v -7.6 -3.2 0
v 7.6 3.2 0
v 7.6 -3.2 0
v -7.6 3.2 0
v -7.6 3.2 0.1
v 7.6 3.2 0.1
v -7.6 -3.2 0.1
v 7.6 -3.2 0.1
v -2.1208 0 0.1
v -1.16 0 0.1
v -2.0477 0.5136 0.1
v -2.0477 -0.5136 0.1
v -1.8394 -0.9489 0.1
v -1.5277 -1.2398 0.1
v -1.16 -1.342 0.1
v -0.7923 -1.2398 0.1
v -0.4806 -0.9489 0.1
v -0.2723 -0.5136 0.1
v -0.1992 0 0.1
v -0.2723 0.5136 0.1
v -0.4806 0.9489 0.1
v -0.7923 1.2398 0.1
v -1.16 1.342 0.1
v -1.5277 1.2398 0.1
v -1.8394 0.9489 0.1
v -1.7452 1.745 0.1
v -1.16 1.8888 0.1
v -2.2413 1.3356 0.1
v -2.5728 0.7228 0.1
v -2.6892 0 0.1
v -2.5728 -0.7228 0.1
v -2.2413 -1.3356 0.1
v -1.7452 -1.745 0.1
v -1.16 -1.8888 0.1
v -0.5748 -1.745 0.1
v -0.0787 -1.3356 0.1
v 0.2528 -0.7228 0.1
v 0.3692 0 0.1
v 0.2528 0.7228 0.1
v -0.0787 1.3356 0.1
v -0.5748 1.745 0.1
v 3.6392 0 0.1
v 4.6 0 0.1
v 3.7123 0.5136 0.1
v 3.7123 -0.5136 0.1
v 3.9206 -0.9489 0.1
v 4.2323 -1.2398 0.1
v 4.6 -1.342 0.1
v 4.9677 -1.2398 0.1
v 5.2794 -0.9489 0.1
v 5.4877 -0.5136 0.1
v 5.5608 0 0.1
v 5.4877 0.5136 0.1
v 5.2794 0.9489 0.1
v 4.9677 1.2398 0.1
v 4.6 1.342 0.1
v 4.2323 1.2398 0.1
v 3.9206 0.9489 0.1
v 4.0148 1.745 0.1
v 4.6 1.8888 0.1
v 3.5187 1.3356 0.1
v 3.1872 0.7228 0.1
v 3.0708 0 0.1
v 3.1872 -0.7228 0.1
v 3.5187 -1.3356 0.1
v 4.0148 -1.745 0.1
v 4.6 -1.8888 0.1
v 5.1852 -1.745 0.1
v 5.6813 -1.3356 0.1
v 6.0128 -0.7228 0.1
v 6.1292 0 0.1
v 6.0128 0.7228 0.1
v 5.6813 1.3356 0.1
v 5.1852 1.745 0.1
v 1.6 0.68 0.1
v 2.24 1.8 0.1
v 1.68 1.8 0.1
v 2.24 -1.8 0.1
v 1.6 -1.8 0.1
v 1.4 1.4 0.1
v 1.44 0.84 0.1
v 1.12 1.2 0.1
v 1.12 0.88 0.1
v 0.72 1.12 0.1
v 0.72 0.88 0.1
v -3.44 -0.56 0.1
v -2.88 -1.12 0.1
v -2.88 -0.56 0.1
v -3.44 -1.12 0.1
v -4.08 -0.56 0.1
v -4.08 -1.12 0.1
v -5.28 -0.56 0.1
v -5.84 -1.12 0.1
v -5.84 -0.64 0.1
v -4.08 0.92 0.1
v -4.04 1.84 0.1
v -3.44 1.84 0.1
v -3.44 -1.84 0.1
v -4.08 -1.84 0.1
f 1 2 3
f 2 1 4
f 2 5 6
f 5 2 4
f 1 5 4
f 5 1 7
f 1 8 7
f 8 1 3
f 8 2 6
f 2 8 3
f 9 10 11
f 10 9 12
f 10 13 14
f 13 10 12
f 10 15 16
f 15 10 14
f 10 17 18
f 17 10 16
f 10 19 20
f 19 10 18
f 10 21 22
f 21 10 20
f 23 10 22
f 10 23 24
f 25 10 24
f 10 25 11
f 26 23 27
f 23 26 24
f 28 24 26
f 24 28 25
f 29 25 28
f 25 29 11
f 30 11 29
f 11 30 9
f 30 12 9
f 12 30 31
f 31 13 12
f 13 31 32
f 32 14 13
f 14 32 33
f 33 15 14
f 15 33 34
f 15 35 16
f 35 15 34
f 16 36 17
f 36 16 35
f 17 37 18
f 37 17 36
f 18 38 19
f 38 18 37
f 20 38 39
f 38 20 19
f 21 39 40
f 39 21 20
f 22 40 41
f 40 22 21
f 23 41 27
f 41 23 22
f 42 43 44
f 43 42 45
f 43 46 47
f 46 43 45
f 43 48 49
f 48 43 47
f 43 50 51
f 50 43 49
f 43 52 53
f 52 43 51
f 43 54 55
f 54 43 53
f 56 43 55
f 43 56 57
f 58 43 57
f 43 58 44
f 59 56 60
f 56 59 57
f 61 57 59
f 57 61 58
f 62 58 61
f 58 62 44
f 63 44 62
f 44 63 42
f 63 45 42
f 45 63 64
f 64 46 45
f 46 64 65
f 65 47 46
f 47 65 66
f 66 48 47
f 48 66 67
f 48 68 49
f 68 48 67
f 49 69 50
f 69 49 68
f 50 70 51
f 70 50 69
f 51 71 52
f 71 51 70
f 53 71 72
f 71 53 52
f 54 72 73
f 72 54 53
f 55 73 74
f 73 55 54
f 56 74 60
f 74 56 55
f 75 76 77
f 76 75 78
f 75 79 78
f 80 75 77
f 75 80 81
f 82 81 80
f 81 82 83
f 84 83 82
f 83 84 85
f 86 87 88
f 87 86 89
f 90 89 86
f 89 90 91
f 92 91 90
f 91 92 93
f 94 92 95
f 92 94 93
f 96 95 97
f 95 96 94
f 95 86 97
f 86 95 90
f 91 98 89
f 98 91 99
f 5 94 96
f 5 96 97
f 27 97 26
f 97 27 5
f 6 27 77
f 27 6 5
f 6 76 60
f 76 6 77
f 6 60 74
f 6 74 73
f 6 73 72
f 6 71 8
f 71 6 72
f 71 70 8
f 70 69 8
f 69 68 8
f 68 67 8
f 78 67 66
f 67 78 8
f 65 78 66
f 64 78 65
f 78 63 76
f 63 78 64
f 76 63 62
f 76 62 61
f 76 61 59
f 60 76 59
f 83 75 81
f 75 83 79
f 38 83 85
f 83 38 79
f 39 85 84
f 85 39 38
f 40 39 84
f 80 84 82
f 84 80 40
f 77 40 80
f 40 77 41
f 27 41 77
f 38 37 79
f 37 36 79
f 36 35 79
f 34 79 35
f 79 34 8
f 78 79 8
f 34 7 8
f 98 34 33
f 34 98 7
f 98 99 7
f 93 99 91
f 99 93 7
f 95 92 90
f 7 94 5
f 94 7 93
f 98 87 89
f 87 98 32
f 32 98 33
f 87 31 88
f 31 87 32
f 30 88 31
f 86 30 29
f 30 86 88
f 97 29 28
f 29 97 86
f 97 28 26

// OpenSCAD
// file: ../p/box5-12.scad
use <../lib.scad>
function ldraw_lib__box5_12() = [
// 0 Box with 5 Faces without Any Edges
// 0 Name: box5-12.dat
// 0 Author: Chris Dee [cwdee]
// 0 !LDRAW_ORG Primitive UPDATE 2009-02
// 0 !LICENSE Licensed under CC BY 2.0 and CC BY 4.0 : see CAreadme.txt
// 
// 0 BFC CERTIFY CCW
  [0,"BFC","CERTIFY"],
  [0,"BFC","CCW"],
// 
// 0 !HISTORY 2009-09-03 [PTadmin] Official Update 2009-02
// 
// 
// 4 16 1 1 1 1 1 -1 -1 1 -1 -1 1 1
  [4,16,1,1,1,1,1,-1,-1,1,-1,-1,1,1],
// 4 16 -1 0 1 1 0 1 1 1 1 -1 1 1
  [4,16,-1,0,1,1,0,1,1,1,1,-1,1,1],
// 4 16 -1 0 -1 -1 0 1 -1 1 1 -1 1 -1
  [4,16,-1,0,-1,-1,0,1,-1,1,1,-1,1,-1],
// 4 16 1 0 -1 -1 0 -1 -1 1 -1 1 1 -1
  [4,16,1,0,-1,-1,0,-1,-1,1,-1,1,1,-1],
// 4 16 1 0 1 1 0 -1 1 1 -1 1 1 1
  [4,16,1,0,1,1,0,-1,1,1,-1,1,1,1],
// 0
];
makepoly(ldraw_lib__box5_12(), line=0.2);
// main file
use <../lib.scad>
use <../p/box5-12.scad>
function ldraw_lib__197875b() = [
// 0 Sticker  0.8 x  1.9 with White "4010"
// 0 Name: 197875b.dat
// 0 Author: Philippe Hurbain [Philo]
// 0 !LDRAW_ORG Part UPDATE 2015-01
// 0 !LICENSE Licensed under CC BY 2.0 and CC BY 4.0 : see CAreadme.txt
// 
// 0 BFC CERTIFY CCW
  [0,"BFC","CERTIFY"],
  [0,"BFC","CCW"],
// 
// 0 !KEYWORDS Set 4010
// 
// 0 !HISTORY 2015-10-11 [PTadmin] Official Update 2015-01
// 
// 
// 1 16 0 -0.25 0 19 0 0 0 0.25 0 0 0 8 box5-12.dat
  [1,16,0,-0.25,0,19,0,0,0,0.25,0,0,0,8, ldraw_lib__box5_12()],
// 4 16 -2.9 -0.25 0 -5.1192 -0.25 1.2839 -5.302 -0.25 0 -5.1192 -0.25 -1.2839
  [4,16,-2.9,-0.25,0,-5.1192,-0.25,1.2839,-5.302,-0.25,0,-5.1192,-0.25,-1.2839],
// 4 16 -2.9 -0.25 0 -5.1192 -0.25 -1.2839 -4.5985 -0.25 -2.3723 -3.8192 -0.25 -3.0996
  [4,16,-2.9,-0.25,0,-5.1192,-0.25,-1.2839,-4.5985,-0.25,-2.3723,-3.8192,-0.25,-3.0996],
// 4 16 -2.9 -0.25 0 -3.8192 -0.25 -3.0996 -2.9 -0.25 -3.355 -1.9808 -0.25 -3.0996
  [4,16,-2.9,-0.25,0,-3.8192,-0.25,-3.0996,-2.9,-0.25,-3.355,-1.9808,-0.25,-3.0996],
// 4 16 -2.9 -0.25 0 -1.9808 -0.25 -3.0996 -1.2015 -0.25 -2.3723 -0.6808 -0.25 -1.2839
  [4,16,-2.9,-0.25,0,-1.9808,-0.25,-3.0996,-1.2015,-0.25,-2.3723,-0.6808,-0.25,-1.2839],
// 4 16 -2.9 -0.25 0 -0.6808 -0.25 -1.2839 -0.498 -0.25 0 -0.6808 -0.25 1.2839
  [4,16,-2.9,-0.25,0,-0.6808,-0.25,-1.2839,-0.498,-0.25,0,-0.6808,-0.25,1.2839],
// 4 16 -2.9 -0.25 0 -0.6808 -0.25 1.2839 -1.2015 -0.25 2.3723 -1.9808 -0.25 3.0996
  [4,16,-2.9,-0.25,0,-0.6808,-0.25,1.2839,-1.2015,-0.25,2.3723,-1.9808,-0.25,3.0996],
// 4 16 -2.9 -0.25 0 -1.9808 -0.25 3.0996 -2.9 -0.25 3.355 -3.8192 -0.25 3.0996
  [4,16,-2.9,-0.25,0,-1.9808,-0.25,3.0996,-2.9,-0.25,3.355,-3.8192,-0.25,3.0996],
// 4 16 -2.9 -0.25 0 -3.8192 -0.25 3.0996 -4.5985 -0.25 2.3723 -5.1192 -0.25 1.2839
  [4,16,-2.9,-0.25,0,-3.8192,-0.25,3.0996,-4.5985,-0.25,2.3723,-5.1192,-0.25,1.2839],
// 4 15 -2.9 -0.25 3.355 -2.9 -0.25 4.722 -4.363 -0.25 4.3626 -3.8192 -0.25 3.0996
  [4,15,-2.9,-0.25,3.355,-2.9,-0.25,4.722,-4.363,-0.25,4.3626,-3.8192,-0.25,3.0996],
// 4 15 -3.8192 -0.25 3.0996 -4.363 -0.25 4.3626 -5.6033 -0.25 3.339 -4.5985 -0.25 2.3723
  [4,15,-3.8192,-0.25,3.0996,-4.363,-0.25,4.3626,-5.6033,-0.25,3.339,-4.5985,-0.25,2.3723],
// 4 15 -4.5985 -0.25 2.3723 -5.6033 -0.25 3.339 -6.432 -0.25 1.807 -5.1192 -0.25 1.2839
  [4,15,-4.5985,-0.25,2.3723,-5.6033,-0.25,3.339,-6.432,-0.25,1.807,-5.1192,-0.25,1.2839],
// 4 15 -5.1192 -0.25 1.2839 -6.432 -0.25 1.807 -6.723 -0.25 0 -5.302 -0.25 0
  [4,15,-5.1192,-0.25,1.2839,-6.432,-0.25,1.807,-6.723,-0.25,0,-5.302,-0.25,0],
// 4 15 -5.302 -0.25 0 -6.723 -0.25 0 -6.432 -0.25 -1.807 -5.1192 -0.25 -1.2839
  [4,15,-5.302,-0.25,0,-6.723,-0.25,0,-6.432,-0.25,-1.807,-5.1192,-0.25,-1.2839],
// 4 15 -5.1192 -0.25 -1.2839 -6.432 -0.25 -1.807 -5.6033 -0.25 -3.339 -4.5985 -0.25 -2.3723
  [4,15,-5.1192,-0.25,-1.2839,-6.432,-0.25,-1.807,-5.6033,-0.25,-3.339,-4.5985,-0.25,-2.3723],
// 4 15 -4.5985 -0.25 -2.3723 -5.6033 -0.25 -3.339 -4.363 -0.25 -4.3626 -3.8192 -0.25 -3.0996
  [4,15,-4.5985,-0.25,-2.3723,-5.6033,-0.25,-3.339,-4.363,-0.25,-4.3626,-3.8192,-0.25,-3.0996],
// 4 15 -3.8192 -0.25 -3.0996 -4.363 -0.25 -4.3626 -2.9 -0.25 -4.722 -2.9 -0.25 -3.355
  [4,15,-3.8192,-0.25,-3.0996,-4.363,-0.25,-4.3626,-2.9,-0.25,-4.722,-2.9,-0.25,-3.355],
// 4 15 -2.9 -0.25 -3.355 -2.9 -0.25 -4.722 -1.437 -0.25 -4.3626 -1.9808 -0.25 -3.0996
  [4,15,-2.9,-0.25,-3.355,-2.9,-0.25,-4.722,-1.437,-0.25,-4.3626,-1.9808,-0.25,-3.0996],
// 4 15 -1.9808 -0.25 -3.0996 -1.437 -0.25 -4.3626 -0.1967 -0.25 -3.339 -1.2015 -0.25 -2.3723
  [4,15,-1.9808,-0.25,-3.0996,-1.437,-0.25,-4.3626,-0.1967,-0.25,-3.339,-1.2015,-0.25,-2.3723],
// 4 15 -1.2015 -0.25 -2.3723 -0.1967 -0.25 -3.339 0.632 -0.25 -1.807 -0.6808 -0.25 -1.2839
  [4,15,-1.2015,-0.25,-2.3723,-0.1967,-0.25,-3.339,0.632,-0.25,-1.807,-0.6808,-0.25,-1.2839],
// 4 15 -0.6808 -0.25 -1.2839 0.632 -0.25 -1.807 0.923 -0.25 0 -0.498 -0.25 0
  [4,15,-0.6808,-0.25,-1.2839,0.632,-0.25,-1.807,0.923,-0.25,0,-0.498,-0.25,0],
// 4 15 -0.498 -0.25 0 0.923 -0.25 0 0.632 -0.25 1.807 -0.6808 -0.25 1.2839
  [4,15,-0.498,-0.25,0,0.923,-0.25,0,0.632,-0.25,1.807,-0.6808,-0.25,1.2839],
// 4 15 -0.6808 -0.25 1.2839 0.632 -0.25 1.807 -0.1967 -0.25 3.339 -1.2015 -0.25 2.3723
  [4,15,-0.6808,-0.25,1.2839,0.632,-0.25,1.807,-0.1967,-0.25,3.339,-1.2015,-0.25,2.3723],
// 4 15 -1.2015 -0.25 2.3723 -0.1967 -0.25 3.339 -1.437 -0.25 4.3626 -1.9808 -0.25 3.0996
  [4,15,-1.2015,-0.25,2.3723,-0.1967,-0.25,3.339,-1.437,-0.25,4.3626,-1.9808,-0.25,3.0996],
// 4 15 -1.9808 -0.25 3.0996 -1.437 -0.25 4.3626 -2.9 -0.25 4.722 -2.9 -0.25 3.355
  [4,15,-1.9808,-0.25,3.0996,-1.437,-0.25,4.3626,-2.9,-0.25,4.722,-2.9,-0.25,3.355],
// 4 16 11.5 -0.25 0 9.2808 -0.25 1.2839 9.098 -0.25 0 9.2808 -0.25 -1.2839
  [4,16,11.5,-0.25,0,9.2808,-0.25,1.2839,9.098,-0.25,0,9.2808,-0.25,-1.2839],
// 4 16 11.5 -0.25 0 9.2808 -0.25 -1.2839 9.8015 -0.25 -2.3723 10.5808 -0.25 -3.0996
  [4,16,11.5,-0.25,0,9.2808,-0.25,-1.2839,9.8015,-0.25,-2.3723,10.5808,-0.25,-3.0996],
// 4 16 11.5 -0.25 0 10.5808 -0.25 -3.0996 11.5 -0.25 -3.355 12.4192 -0.25 -3.0996
  [4,16,11.5,-0.25,0,10.5808,-0.25,-3.0996,11.5,-0.25,-3.355,12.4192,-0.25,-3.0996],
// 4 16 11.5 -0.25 0 12.4192 -0.25 -3.0996 13.1985 -0.25 -2.3723 13.7192 -0.25 -1.2839
  [4,16,11.5,-0.25,0,12.4192,-0.25,-3.0996,13.1985,-0.25,-2.3723,13.7192,-0.25,-1.2839],
// 4 16 11.5 -0.25 0 13.7192 -0.25 -1.2839 13.902 -0.25 0 13.7192 -0.25 1.2839
  [4,16,11.5,-0.25,0,13.7192,-0.25,-1.2839,13.902,-0.25,0,13.7192,-0.25,1.2839],
// 4 16 11.5 -0.25 0 13.7192 -0.25 1.2839 13.1985 -0.25 2.3723 12.4192 -0.25 3.0996
  [4,16,11.5,-0.25,0,13.7192,-0.25,1.2839,13.1985,-0.25,2.3723,12.4192,-0.25,3.0996],
// 4 16 11.5 -0.25 0 12.4192 -0.25 3.0996 11.5 -0.25 3.355 10.5808 -0.25 3.0996
  [4,16,11.5,-0.25,0,12.4192,-0.25,3.0996,11.5,-0.25,3.355,10.5808,-0.25,3.0996],
// 4 16 11.5 -0.25 0 10.5808 -0.25 3.0996 9.8015 -0.25 2.3723 9.2808 -0.25 1.2839
  [4,16,11.5,-0.25,0,10.5808,-0.25,3.0996,9.8015,-0.25,2.3723,9.2808,-0.25,1.2839],
// 4 15 11.5 -0.25 3.355 11.5 -0.25 4.722 10.037 -0.25 4.3626 10.5808 -0.25 3.0996
  [4,15,11.5,-0.25,3.355,11.5,-0.25,4.722,10.037,-0.25,4.3626,10.5808,-0.25,3.0996],
// 4 15 10.5808 -0.25 3.0996 10.037 -0.25 4.3626 8.7967 -0.25 3.339 9.8015 -0.25 2.3723
  [4,15,10.5808,-0.25,3.0996,10.037,-0.25,4.3626,8.7967,-0.25,3.339,9.8015,-0.25,2.3723],
// 4 15 9.8015 -0.25 2.3723 8.7967 -0.25 3.339 7.968 -0.25 1.807 9.2808 -0.25 1.2839
  [4,15,9.8015,-0.25,2.3723,8.7967,-0.25,3.339,7.968,-0.25,1.807,9.2808,-0.25,1.2839],
// 4 15 9.2808 -0.25 1.2839 7.968 -0.25 1.807 7.677 -0.25 0 9.098 -0.25 0
  [4,15,9.2808,-0.25,1.2839,7.968,-0.25,1.807,7.677,-0.25,0,9.098,-0.25,0],
// 4 15 9.098 -0.25 0 7.677 -0.25 0 7.968 -0.25 -1.807 9.2808 -0.25 -1.2839
  [4,15,9.098,-0.25,0,7.677,-0.25,0,7.968,-0.25,-1.807,9.2808,-0.25,-1.2839],
// 4 15 9.2808 -0.25 -1.2839 7.968 -0.25 -1.807 8.7967 -0.25 -3.339 9.8015 -0.25 -2.3723
  [4,15,9.2808,-0.25,-1.2839,7.968,-0.25,-1.807,8.7967,-0.25,-3.339,9.8015,-0.25,-2.3723],
// 4 15 9.8015 -0.25 -2.3723 8.7967 -0.25 -3.339 10.037 -0.25 -4.3626 10.5808 -0.25 -3.0996
  [4,15,9.8015,-0.25,-2.3723,8.7967,-0.25,-3.339,10.037,-0.25,-4.3626,10.5808,-0.25,-3.0996],
// 4 15 10.5808 -0.25 -3.0996 10.037 -0.25 -4.3626 11.5 -0.25 -4.722 11.5 -0.25 -3.355
  [4,15,10.5808,-0.25,-3.0996,10.037,-0.25,-4.3626,11.5,-0.25,-4.722,11.5,-0.25,-3.355],
// 4 15 11.5 -0.25 -3.355 11.5 -0.25 -4.722 12.963 -0.25 -4.3626 12.4192 -0.25 -3.0996
  [4,15,11.5,-0.25,-3.355,11.5,-0.25,-4.722,12.963,-0.25,-4.3626,12.4192,-0.25,-3.0996],
// 4 15 12.4192 -0.25 -3.0996 12.963 -0.25 -4.3626 14.2033 -0.25 -3.339 13.1985 -0.25 -2.3723
  [4,15,12.4192,-0.25,-3.0996,12.963,-0.25,-4.3626,14.2033,-0.25,-3.339,13.1985,-0.25,-2.3723],
// 4 15 13.1985 -0.25 -2.3723 14.2033 -0.25 -3.339 15.032 -0.25 -1.807 13.7192 -0.25 -1.2839
  [4,15,13.1985,-0.25,-2.3723,14.2033,-0.25,-3.339,15.032,-0.25,-1.807,13.7192,-0.25,-1.2839],
// 4 15 13.7192 -0.25 -1.2839 15.032 -0.25 -1.807 15.323 -0.25 0 13.902 -0.25 0
  [4,15,13.7192,-0.25,-1.2839,15.032,-0.25,-1.807,15.323,-0.25,0,13.902,-0.25,0],
// 4 15 13.902 -0.25 0 15.323 -0.25 0 15.032 -0.25 1.807 13.7192 -0.25 1.2839
  [4,15,13.902,-0.25,0,15.323,-0.25,0,15.032,-0.25,1.807,13.7192,-0.25,1.2839],
// 4 15 13.7192 -0.25 1.2839 15.032 -0.25 1.807 14.2033 -0.25 3.339 13.1985 -0.25 2.3723
  [4,15,13.7192,-0.25,1.2839,15.032,-0.25,1.807,14.2033,-0.25,3.339,13.1985,-0.25,2.3723],
// 4 15 13.1985 -0.25 2.3723 14.2033 -0.25 3.339 12.963 -0.25 4.3626 12.4192 -0.25 3.0996
  [4,15,13.1985,-0.25,2.3723,14.2033,-0.25,3.339,12.963,-0.25,4.3626,12.4192,-0.25,3.0996],
// 4 15 12.4192 -0.25 3.0996 12.963 -0.25 4.3626 11.5 -0.25 4.722 11.5 -0.25 3.355
  [4,15,12.4192,-0.25,3.0996,12.963,-0.25,4.3626,11.5,-0.25,4.722,11.5,-0.25,3.355],
// 4 15 5.6 -0.25 -4.5 5.6 -0.25 4.5 4.2 -0.25 4.5 4 -0.25 1.7
  [4,15,5.6,-0.25,-4.5,5.6,-0.25,4.5,4.2,-0.25,4.5,4,-0.25,1.7],
// 3 15 4 -0.25 1.7 4 -0.25 -4.5 5.6 -0.25 -4.5
  [3,15,4,-0.25,1.7,4,-0.25,-4.5,5.6,-0.25,-4.5],
// 4 15 4 -0.25 1.7 4.2 -0.25 4.5 3.5 -0.25 3.5 3.6 -0.25 2.1
  [4,15,4,-0.25,1.7,4.2,-0.25,4.5,3.5,-0.25,3.5,3.6,-0.25,2.1],
// 4 15 3.6 -0.25 2.1 3.5 -0.25 3.5 2.8 -0.25 3 2.8 -0.25 2.2
  [4,15,3.6,-0.25,2.1,3.5,-0.25,3.5,2.8,-0.25,3,2.8,-0.25,2.2],
// 4 15 1.8 -0.25 2.2 2.8 -0.25 2.2 2.8 -0.25 3 1.8 -0.25 2.8
  [4,15,1.8,-0.25,2.2,2.8,-0.25,2.2,2.8,-0.25,3,1.8,-0.25,2.8],
// 4 15 -7.2 -0.25 -2.8 -7.2 -0.25 -1.4 -8.6 -0.25 -1.4 -8.6 -0.25 -2.8
  [4,15,-7.2,-0.25,-2.8,-7.2,-0.25,-1.4,-8.6,-0.25,-1.4,-8.6,-0.25,-2.8],
// 4 15 -8.6 -0.25 -2.8 -8.6 -0.25 -1.4 -10.2 -0.25 -1.4 -10.2 -0.25 -2.8
  [4,15,-8.6,-0.25,-2.8,-8.6,-0.25,-1.4,-10.2,-0.25,-1.4,-10.2,-0.25,-2.8],
// 4 15 -10.2 -0.25 -2.8 -10.2 -0.25 -1.4 -13.2 -0.25 -1.4 -14.6 -0.25 -2.8
  [4,15,-10.2,-0.25,-2.8,-10.2,-0.25,-1.4,-13.2,-0.25,-1.4,-14.6,-0.25,-2.8],
// 4 15 -14.6 -0.25 -1.6 -14.6 -0.25 -2.8 -13.2 -0.25 -1.4 -10.2 -0.25 2.3
  [4,15,-14.6,-0.25,-1.6,-14.6,-0.25,-2.8,-13.2,-0.25,-1.4,-10.2,-0.25,2.3],
// 4 15 -10.1 -0.25 4.6 -14.6 -0.25 -1.6 -10.2 -0.25 2.3 -8.6 -0.25 4.6
  [4,15,-10.1,-0.25,4.6,-14.6,-0.25,-1.6,-10.2,-0.25,2.3,-8.6,-0.25,4.6],
// 4 15 -8.6 -0.25 -1.4 -8.6 -0.25 4.6 -10.2 -0.25 2.3 -10.2 -0.25 -1.4
  [4,15,-8.6,-0.25,-1.4,-8.6,-0.25,4.6,-10.2,-0.25,2.3,-10.2,-0.25,-1.4],
// 4 15 -8.6 -0.25 -2.8 -10.2 -0.25 -2.8 -10.2 -0.25 -4.6 -8.6 -0.25 -4.6
  [4,15,-8.6,-0.25,-2.8,-10.2,-0.25,-2.8,-10.2,-0.25,-4.6,-8.6,-0.25,-4.6],
// 3 16 -19 -0.25 8 -14.6 -0.25 -1.6 -10.1 -0.25 4.6
  [3,16,-19,-0.25,8,-14.6,-0.25,-1.6,-10.1,-0.25,4.6],
// 3 16 -19 -0.25 8 -10.1 -0.25 4.6 -8.6 -0.25 4.6
  [3,16,-19,-0.25,8,-10.1,-0.25,4.6,-8.6,-0.25,4.6],
// 4 16 -19 -0.25 8 -8.6 -0.25 4.6 -4.363 -0.25 4.3626 -2.9 -0.25 4.722
  [4,16,-19,-0.25,8,-8.6,-0.25,4.6,-4.363,-0.25,4.3626,-2.9,-0.25,4.722],
// 4 16 -19 -0.25 8 -2.9 -0.25 4.722 4.2 -0.25 4.5 19 -0.25 8
  [4,16,-19,-0.25,8,-2.9,-0.25,4.722,4.2,-0.25,4.5,19,-0.25,8],
// 4 16 19 -0.25 8 4.2 -0.25 4.5 5.6 -0.25 4.5 11.5 -0.25 4.722
  [4,16,19,-0.25,8,4.2,-0.25,4.5,5.6,-0.25,4.5,11.5,-0.25,4.722],
// 3 16 19 -0.25 8 11.5 -0.25 4.722 12.963 -0.25 4.3626
  [3,16,19,-0.25,8,11.5,-0.25,4.722,12.963,-0.25,4.3626],
// 3 16 19 -0.25 8 12.963 -0.25 4.3626 14.2033 -0.25 3.339
  [3,16,19,-0.25,8,12.963,-0.25,4.3626,14.2033,-0.25,3.339],
// 3 16 19 -0.25 8 14.2033 -0.25 3.339 15.032 -0.25 1.807
  [3,16,19,-0.25,8,14.2033,-0.25,3.339,15.032,-0.25,1.807],
// 4 16 19 -0.25 8 15.032 -0.25 1.807 15.323 -0.25 0 19 -0.25 -8
  [4,16,19,-0.25,8,15.032,-0.25,1.807,15.323,-0.25,0,19,-0.25,-8],
// 3 16 15.323 -0.25 0 15.032 -0.25 -1.807 19 -0.25 -8
  [3,16,15.323,-0.25,0,15.032,-0.25,-1.807,19,-0.25,-8],
// 3 16 15.032 -0.25 -1.807 14.2033 -0.25 -3.339 19 -0.25 -8
  [3,16,15.032,-0.25,-1.807,14.2033,-0.25,-3.339,19,-0.25,-8],
// 3 16 14.2033 -0.25 -3.339 12.963 -0.25 -4.3626 19 -0.25 -8
  [3,16,14.2033,-0.25,-3.339,12.963,-0.25,-4.3626,19,-0.25,-8],
// 3 16 12.963 -0.25 -4.3626 11.5 -0.25 -4.722 19 -0.25 -8
  [3,16,12.963,-0.25,-4.3626,11.5,-0.25,-4.722,19,-0.25,-8],
// 4 16 5.6 -0.25 -4.5 19 -0.25 -8 11.5 -0.25 -4.722 10.037 -0.25 -4.3626
  [4,16,5.6,-0.25,-4.5,19,-0.25,-8,11.5,-0.25,-4.722,10.037,-0.25,-4.3626],
// 3 16 8.7967 -0.25 -3.339 5.6 -0.25 -4.5 10.037 -0.25 -4.3626
  [3,16,8.7967,-0.25,-3.339,5.6,-0.25,-4.5,10.037,-0.25,-4.3626],
// 3 16 7.968 -0.25 -1.807 5.6 -0.25 -4.5 8.7967 -0.25 -3.339
  [3,16,7.968,-0.25,-1.807,5.6,-0.25,-4.5,8.7967,-0.25,-3.339],
// 4 16 5.6 -0.25 -4.5 7.968 -0.25 -1.807 7.677 -0.25 0 5.6 -0.25 4.5
  [4,16,5.6,-0.25,-4.5,7.968,-0.25,-1.807,7.677,-0.25,0,5.6,-0.25,4.5],
// 3 16 5.6 -0.25 4.5 7.677 -0.25 0 7.968 -0.25 1.807
  [3,16,5.6,-0.25,4.5,7.677,-0.25,0,7.968,-0.25,1.807],
// 3 16 5.6 -0.25 4.5 7.968 -0.25 1.807 8.7967 -0.25 3.339
  [3,16,5.6,-0.25,4.5,7.968,-0.25,1.807,8.7967,-0.25,3.339],
// 3 16 5.6 -0.25 4.5 8.7967 -0.25 3.339 10.037 -0.25 4.3626
  [3,16,5.6,-0.25,4.5,8.7967,-0.25,3.339,10.037,-0.25,4.3626],
// 3 16 11.5 -0.25 4.722 5.6 -0.25 4.5 10.037 -0.25 4.3626
  [3,16,11.5,-0.25,4.722,5.6,-0.25,4.5,10.037,-0.25,4.3626],
// 4 16 4 -0.25 -4.5 4 -0.25 1.7 3.6 -0.25 2.1 2.8 -0.25 2.2
  [4,16,4,-0.25,-4.5,4,-0.25,1.7,3.6,-0.25,2.1,2.8,-0.25,2.2],
// 4 16 4 -0.25 -4.5 2.8 -0.25 2.2 1.8 -0.25 2.2 0.923 -0.25 0
  [4,16,4,-0.25,-4.5,2.8,-0.25,2.2,1.8,-0.25,2.2,0.923,-0.25,0],
// 4 16 0.632 -0.25 1.807 0.923 -0.25 0 1.8 -0.25 2.2 1.8 -0.25 2.8
  [4,16,0.632,-0.25,1.807,0.923,-0.25,0,1.8,-0.25,2.2,1.8,-0.25,2.8],
// 3 16 -0.1967 -0.25 3.339 0.632 -0.25 1.807 1.8 -0.25 2.8
  [3,16,-0.1967,-0.25,3.339,0.632,-0.25,1.807,1.8,-0.25,2.8],
// 4 16 -0.1967 -0.25 3.339 1.8 -0.25 2.8 2.8 -0.25 3 3.5 -0.25 3.5
  [4,16,-0.1967,-0.25,3.339,1.8,-0.25,2.8,2.8,-0.25,3,3.5,-0.25,3.5],
// 4 16 -0.1967 -0.25 3.339 3.5 -0.25 3.5 4.2 -0.25 4.5 -1.437 -0.25 4.3626
  [4,16,-0.1967,-0.25,3.339,3.5,-0.25,3.5,4.2,-0.25,4.5,-1.437,-0.25,4.3626],
// 3 16 -2.9 -0.25 4.722 -1.437 -0.25 4.3626 4.2 -0.25 4.5
  [3,16,-2.9,-0.25,4.722,-1.437,-0.25,4.3626,4.2,-0.25,4.5],
// 3 16 0.923 -0.25 0 0.632 -0.25 -1.807 4 -0.25 -4.5
  [3,16,0.923,-0.25,0,0.632,-0.25,-1.807,4,-0.25,-4.5],
// 3 16 0.632 -0.25 -1.807 -0.1967 -0.25 -3.339 4 -0.25 -4.5
  [3,16,0.632,-0.25,-1.807,-0.1967,-0.25,-3.339,4,-0.25,-4.5],
// 3 16 -0.1967 -0.25 -3.339 -1.437 -0.25 -4.3626 4 -0.25 -4.5
  [3,16,-0.1967,-0.25,-3.339,-1.437,-0.25,-4.3626,4,-0.25,-4.5],
// 4 16 19 -0.25 -8 4 -0.25 -4.5 -1.437 -0.25 -4.3626 -2.9 -0.25 -4.722
  [4,16,19,-0.25,-8,4,-0.25,-4.5,-1.437,-0.25,-4.3626,-2.9,-0.25,-4.722],
// 3 16 5.6 -0.25 -4.5 4 -0.25 -4.5 19 -0.25 -8
  [3,16,5.6,-0.25,-4.5,4,-0.25,-4.5,19,-0.25,-8],
// 3 16 -2.9 -0.25 -4.722 -19 -0.25 -8 19 -0.25 -8
  [3,16,-2.9,-0.25,-4.722,-19,-0.25,-8,19,-0.25,-8],
// 4 16 -19 -0.25 -8 -2.9 -0.25 -4.722 -4.363 -0.25 -4.3626 -8.6 -0.25 -4.6
  [4,16,-19,-0.25,-8,-2.9,-0.25,-4.722,-4.363,-0.25,-4.3626,-8.6,-0.25,-4.6],
// 3 16 -8.6 -0.25 -4.6 -10.2 -0.25 -4.6 -19 -0.25 -8
  [3,16,-8.6,-0.25,-4.6,-10.2,-0.25,-4.6,-19,-0.25,-8],
// 4 16 -14.6 -0.25 -2.8 -19 -0.25 -8 -10.2 -0.25 -4.6 -10.2 -0.25 -2.8
  [4,16,-14.6,-0.25,-2.8,-19,-0.25,-8,-10.2,-0.25,-4.6,-10.2,-0.25,-2.8],
// 3 16 -10.2 -0.25 2.3 -13.2 -0.25 -1.4 -10.2 -0.25 -1.4
  [3,16,-10.2,-0.25,2.3,-13.2,-0.25,-1.4,-10.2,-0.25,-1.4],
// 4 16 -19 -0.25 -8 -14.6 -0.25 -2.8 -14.6 -0.25 -1.6 -19 -0.25 8
  [4,16,-19,-0.25,-8,-14.6,-0.25,-2.8,-14.6,-0.25,-1.6,-19,-0.25,8],
// 4 16 -7.2 -0.25 -2.8 -8.6 -0.25 -2.8 -8.6 -0.25 -4.6 -5.6033 -0.25 -3.339
  [4,16,-7.2,-0.25,-2.8,-8.6,-0.25,-2.8,-8.6,-0.25,-4.6,-5.6033,-0.25,-3.339],
// 3 16 -5.6033 -0.25 -3.339 -8.6 -0.25 -4.6 -4.363 -0.25 -4.3626
  [3,16,-5.6033,-0.25,-3.339,-8.6,-0.25,-4.6,-4.363,-0.25,-4.3626],
// 4 16 -6.432 -0.25 -1.807 -7.2 -0.25 -1.4 -7.2 -0.25 -2.8 -5.6033 -0.25 -3.339
  [4,16,-6.432,-0.25,-1.807,-7.2,-0.25,-1.4,-7.2,-0.25,-2.8,-5.6033,-0.25,-3.339],
// 3 16 -6.723 -0.25 0 -7.2 -0.25 -1.4 -6.432 -0.25 -1.807
  [3,16,-6.723,-0.25,0,-7.2,-0.25,-1.4,-6.432,-0.25,-1.807],
// 4 16 -8.6 -0.25 -1.4 -7.2 -0.25 -1.4 -6.723 -0.25 0 -6.432 -0.25 1.807
  [4,16,-8.6,-0.25,-1.4,-7.2,-0.25,-1.4,-6.723,-0.25,0,-6.432,-0.25,1.807],
// 4 16 -8.6 -0.25 4.6 -8.6 -0.25 -1.4 -6.432 -0.25 1.807 -5.6033 -0.25 3.339
  [4,16,-8.6,-0.25,4.6,-8.6,-0.25,-1.4,-6.432,-0.25,1.807,-5.6033,-0.25,3.339],
// 3 16 -8.6 -0.25 4.6 -5.6033 -0.25 3.339 -4.363 -0.25 4.3626
  [3,16,-8.6,-0.25,4.6,-5.6033,-0.25,3.339,-4.363,-0.25,4.3626],
];
makepoly(ldraw_lib__197875b(), line=0.2);
